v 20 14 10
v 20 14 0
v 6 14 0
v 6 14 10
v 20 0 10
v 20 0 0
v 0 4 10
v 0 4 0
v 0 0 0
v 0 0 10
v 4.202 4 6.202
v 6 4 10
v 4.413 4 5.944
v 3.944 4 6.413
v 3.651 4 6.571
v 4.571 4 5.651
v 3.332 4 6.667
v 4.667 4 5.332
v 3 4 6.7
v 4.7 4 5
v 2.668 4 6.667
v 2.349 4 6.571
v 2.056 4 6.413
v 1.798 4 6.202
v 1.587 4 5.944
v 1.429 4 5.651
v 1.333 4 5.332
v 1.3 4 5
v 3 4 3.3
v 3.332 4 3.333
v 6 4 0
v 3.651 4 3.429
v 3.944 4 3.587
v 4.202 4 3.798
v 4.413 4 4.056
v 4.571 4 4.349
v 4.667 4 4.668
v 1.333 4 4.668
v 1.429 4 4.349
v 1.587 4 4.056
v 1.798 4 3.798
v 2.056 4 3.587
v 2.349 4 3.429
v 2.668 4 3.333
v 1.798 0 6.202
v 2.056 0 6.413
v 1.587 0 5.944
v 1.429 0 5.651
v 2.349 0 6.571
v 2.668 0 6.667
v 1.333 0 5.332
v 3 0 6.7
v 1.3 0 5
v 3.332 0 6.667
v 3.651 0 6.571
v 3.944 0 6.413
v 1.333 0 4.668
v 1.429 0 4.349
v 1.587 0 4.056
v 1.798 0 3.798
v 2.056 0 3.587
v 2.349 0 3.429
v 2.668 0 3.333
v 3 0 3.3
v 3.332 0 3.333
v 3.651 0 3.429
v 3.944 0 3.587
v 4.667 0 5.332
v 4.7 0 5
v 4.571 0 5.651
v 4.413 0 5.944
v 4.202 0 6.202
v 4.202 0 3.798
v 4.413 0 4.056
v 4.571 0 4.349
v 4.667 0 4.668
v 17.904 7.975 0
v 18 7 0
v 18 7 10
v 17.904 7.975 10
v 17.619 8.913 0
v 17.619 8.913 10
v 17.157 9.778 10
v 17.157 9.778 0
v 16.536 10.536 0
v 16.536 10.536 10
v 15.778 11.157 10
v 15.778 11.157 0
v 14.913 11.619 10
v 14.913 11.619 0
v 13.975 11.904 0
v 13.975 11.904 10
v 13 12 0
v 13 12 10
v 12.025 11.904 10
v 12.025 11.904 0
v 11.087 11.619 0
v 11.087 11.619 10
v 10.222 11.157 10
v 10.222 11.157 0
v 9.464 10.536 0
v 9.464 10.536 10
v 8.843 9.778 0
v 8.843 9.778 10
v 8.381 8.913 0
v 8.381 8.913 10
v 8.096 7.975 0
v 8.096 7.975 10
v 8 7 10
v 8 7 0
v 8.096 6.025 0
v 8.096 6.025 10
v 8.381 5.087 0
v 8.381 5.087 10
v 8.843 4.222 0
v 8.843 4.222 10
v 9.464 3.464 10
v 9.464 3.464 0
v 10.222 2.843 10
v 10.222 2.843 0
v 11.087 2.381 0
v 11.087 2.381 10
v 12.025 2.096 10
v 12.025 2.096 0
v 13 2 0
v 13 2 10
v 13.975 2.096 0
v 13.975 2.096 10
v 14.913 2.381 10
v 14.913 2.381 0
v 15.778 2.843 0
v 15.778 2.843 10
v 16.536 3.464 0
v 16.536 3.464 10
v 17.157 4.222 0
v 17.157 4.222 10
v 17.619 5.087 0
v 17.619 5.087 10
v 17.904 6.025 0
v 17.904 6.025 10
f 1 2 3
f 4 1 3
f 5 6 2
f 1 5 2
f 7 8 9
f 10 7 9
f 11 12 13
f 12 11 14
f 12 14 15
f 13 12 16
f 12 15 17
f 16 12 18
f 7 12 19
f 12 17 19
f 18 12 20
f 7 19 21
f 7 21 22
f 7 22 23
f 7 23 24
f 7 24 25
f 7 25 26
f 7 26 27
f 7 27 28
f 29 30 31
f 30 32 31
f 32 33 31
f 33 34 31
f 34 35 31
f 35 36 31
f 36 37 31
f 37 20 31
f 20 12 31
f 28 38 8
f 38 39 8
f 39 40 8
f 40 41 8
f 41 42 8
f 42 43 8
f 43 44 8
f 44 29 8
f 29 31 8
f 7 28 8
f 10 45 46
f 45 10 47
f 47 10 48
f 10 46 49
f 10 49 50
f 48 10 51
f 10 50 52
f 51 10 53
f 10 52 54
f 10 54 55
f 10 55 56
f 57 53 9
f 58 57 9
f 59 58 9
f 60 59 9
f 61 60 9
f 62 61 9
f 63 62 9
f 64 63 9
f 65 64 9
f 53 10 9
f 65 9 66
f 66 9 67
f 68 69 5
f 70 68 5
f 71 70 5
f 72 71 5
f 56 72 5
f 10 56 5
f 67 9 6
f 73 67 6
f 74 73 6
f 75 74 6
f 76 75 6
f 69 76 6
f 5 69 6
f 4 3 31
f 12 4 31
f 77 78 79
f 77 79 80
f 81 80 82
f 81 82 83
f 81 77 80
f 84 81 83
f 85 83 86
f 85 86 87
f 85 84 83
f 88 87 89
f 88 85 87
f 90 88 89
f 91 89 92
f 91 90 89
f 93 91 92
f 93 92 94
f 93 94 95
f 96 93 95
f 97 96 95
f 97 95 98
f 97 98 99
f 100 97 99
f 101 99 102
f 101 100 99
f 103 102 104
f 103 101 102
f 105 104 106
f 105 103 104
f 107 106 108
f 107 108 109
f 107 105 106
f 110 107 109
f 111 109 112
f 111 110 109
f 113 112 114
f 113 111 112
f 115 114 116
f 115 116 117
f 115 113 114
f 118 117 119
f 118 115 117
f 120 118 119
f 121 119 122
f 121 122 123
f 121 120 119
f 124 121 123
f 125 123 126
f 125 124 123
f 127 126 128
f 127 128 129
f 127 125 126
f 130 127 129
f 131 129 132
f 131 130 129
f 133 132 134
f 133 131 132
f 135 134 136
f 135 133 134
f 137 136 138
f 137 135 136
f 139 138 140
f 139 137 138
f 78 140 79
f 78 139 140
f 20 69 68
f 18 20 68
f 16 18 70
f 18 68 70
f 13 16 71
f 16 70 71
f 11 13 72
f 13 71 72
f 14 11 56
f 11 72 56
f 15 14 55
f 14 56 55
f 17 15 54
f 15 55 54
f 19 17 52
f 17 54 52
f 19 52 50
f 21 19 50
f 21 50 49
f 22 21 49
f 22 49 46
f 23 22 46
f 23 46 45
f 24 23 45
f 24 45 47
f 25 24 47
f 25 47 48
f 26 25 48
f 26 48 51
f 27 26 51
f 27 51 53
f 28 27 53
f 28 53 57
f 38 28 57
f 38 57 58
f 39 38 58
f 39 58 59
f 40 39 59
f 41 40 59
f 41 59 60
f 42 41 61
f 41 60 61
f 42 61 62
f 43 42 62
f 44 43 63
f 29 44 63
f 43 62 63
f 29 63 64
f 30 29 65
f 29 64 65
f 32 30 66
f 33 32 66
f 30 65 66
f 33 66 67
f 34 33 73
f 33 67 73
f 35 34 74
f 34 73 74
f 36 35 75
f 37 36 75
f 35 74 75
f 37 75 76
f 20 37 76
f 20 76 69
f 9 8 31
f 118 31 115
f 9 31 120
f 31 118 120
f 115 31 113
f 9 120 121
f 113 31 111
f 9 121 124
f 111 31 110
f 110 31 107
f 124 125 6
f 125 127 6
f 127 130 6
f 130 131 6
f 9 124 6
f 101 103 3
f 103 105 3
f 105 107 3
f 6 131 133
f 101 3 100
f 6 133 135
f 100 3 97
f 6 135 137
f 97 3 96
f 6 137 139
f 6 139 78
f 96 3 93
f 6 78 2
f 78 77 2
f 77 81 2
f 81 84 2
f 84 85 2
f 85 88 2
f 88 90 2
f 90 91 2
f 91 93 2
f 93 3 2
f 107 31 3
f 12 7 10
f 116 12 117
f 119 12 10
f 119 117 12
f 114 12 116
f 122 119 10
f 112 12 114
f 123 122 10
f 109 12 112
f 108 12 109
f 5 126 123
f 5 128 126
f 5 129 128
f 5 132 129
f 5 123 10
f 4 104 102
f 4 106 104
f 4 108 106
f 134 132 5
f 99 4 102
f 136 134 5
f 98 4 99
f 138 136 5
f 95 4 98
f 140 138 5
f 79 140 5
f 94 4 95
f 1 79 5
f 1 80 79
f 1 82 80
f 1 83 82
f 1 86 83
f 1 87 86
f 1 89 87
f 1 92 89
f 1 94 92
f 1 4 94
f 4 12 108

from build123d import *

# Parameters (mm, degrees)
SKETCH1_R            = 5
BOSS_EXTRUDE1_DEPTH  = 10
M3_CLEARANCE_HOLE1_D = 3.4


with BuildPart() as part:
    # Sketch1 → Boss-Extrude1 (new body)
    with BuildSketch(Plane.XY):
        Polygon((0, 0), (20, 0), (20, 14), (6, 14), (6, 4), (0, 4), align=None)
        with Locations((13, 7)):
            Circle(SKETCH1_R, mode=Mode.SUBTRACT)
    extrude(amount=BOSS_EXTRUDE1_DEPTH)

    # M3 Clearance Hole1 (through all)
    with Locations(Plane(origin=(0, 4, 0), x_dir=(-1, 0, 0), z_dir=(0, 1, 0))):
        with Locations((-3, 5)):
            Hole(M3_CLEARANCE_HOLE1_D / 2)


solid = part.part
